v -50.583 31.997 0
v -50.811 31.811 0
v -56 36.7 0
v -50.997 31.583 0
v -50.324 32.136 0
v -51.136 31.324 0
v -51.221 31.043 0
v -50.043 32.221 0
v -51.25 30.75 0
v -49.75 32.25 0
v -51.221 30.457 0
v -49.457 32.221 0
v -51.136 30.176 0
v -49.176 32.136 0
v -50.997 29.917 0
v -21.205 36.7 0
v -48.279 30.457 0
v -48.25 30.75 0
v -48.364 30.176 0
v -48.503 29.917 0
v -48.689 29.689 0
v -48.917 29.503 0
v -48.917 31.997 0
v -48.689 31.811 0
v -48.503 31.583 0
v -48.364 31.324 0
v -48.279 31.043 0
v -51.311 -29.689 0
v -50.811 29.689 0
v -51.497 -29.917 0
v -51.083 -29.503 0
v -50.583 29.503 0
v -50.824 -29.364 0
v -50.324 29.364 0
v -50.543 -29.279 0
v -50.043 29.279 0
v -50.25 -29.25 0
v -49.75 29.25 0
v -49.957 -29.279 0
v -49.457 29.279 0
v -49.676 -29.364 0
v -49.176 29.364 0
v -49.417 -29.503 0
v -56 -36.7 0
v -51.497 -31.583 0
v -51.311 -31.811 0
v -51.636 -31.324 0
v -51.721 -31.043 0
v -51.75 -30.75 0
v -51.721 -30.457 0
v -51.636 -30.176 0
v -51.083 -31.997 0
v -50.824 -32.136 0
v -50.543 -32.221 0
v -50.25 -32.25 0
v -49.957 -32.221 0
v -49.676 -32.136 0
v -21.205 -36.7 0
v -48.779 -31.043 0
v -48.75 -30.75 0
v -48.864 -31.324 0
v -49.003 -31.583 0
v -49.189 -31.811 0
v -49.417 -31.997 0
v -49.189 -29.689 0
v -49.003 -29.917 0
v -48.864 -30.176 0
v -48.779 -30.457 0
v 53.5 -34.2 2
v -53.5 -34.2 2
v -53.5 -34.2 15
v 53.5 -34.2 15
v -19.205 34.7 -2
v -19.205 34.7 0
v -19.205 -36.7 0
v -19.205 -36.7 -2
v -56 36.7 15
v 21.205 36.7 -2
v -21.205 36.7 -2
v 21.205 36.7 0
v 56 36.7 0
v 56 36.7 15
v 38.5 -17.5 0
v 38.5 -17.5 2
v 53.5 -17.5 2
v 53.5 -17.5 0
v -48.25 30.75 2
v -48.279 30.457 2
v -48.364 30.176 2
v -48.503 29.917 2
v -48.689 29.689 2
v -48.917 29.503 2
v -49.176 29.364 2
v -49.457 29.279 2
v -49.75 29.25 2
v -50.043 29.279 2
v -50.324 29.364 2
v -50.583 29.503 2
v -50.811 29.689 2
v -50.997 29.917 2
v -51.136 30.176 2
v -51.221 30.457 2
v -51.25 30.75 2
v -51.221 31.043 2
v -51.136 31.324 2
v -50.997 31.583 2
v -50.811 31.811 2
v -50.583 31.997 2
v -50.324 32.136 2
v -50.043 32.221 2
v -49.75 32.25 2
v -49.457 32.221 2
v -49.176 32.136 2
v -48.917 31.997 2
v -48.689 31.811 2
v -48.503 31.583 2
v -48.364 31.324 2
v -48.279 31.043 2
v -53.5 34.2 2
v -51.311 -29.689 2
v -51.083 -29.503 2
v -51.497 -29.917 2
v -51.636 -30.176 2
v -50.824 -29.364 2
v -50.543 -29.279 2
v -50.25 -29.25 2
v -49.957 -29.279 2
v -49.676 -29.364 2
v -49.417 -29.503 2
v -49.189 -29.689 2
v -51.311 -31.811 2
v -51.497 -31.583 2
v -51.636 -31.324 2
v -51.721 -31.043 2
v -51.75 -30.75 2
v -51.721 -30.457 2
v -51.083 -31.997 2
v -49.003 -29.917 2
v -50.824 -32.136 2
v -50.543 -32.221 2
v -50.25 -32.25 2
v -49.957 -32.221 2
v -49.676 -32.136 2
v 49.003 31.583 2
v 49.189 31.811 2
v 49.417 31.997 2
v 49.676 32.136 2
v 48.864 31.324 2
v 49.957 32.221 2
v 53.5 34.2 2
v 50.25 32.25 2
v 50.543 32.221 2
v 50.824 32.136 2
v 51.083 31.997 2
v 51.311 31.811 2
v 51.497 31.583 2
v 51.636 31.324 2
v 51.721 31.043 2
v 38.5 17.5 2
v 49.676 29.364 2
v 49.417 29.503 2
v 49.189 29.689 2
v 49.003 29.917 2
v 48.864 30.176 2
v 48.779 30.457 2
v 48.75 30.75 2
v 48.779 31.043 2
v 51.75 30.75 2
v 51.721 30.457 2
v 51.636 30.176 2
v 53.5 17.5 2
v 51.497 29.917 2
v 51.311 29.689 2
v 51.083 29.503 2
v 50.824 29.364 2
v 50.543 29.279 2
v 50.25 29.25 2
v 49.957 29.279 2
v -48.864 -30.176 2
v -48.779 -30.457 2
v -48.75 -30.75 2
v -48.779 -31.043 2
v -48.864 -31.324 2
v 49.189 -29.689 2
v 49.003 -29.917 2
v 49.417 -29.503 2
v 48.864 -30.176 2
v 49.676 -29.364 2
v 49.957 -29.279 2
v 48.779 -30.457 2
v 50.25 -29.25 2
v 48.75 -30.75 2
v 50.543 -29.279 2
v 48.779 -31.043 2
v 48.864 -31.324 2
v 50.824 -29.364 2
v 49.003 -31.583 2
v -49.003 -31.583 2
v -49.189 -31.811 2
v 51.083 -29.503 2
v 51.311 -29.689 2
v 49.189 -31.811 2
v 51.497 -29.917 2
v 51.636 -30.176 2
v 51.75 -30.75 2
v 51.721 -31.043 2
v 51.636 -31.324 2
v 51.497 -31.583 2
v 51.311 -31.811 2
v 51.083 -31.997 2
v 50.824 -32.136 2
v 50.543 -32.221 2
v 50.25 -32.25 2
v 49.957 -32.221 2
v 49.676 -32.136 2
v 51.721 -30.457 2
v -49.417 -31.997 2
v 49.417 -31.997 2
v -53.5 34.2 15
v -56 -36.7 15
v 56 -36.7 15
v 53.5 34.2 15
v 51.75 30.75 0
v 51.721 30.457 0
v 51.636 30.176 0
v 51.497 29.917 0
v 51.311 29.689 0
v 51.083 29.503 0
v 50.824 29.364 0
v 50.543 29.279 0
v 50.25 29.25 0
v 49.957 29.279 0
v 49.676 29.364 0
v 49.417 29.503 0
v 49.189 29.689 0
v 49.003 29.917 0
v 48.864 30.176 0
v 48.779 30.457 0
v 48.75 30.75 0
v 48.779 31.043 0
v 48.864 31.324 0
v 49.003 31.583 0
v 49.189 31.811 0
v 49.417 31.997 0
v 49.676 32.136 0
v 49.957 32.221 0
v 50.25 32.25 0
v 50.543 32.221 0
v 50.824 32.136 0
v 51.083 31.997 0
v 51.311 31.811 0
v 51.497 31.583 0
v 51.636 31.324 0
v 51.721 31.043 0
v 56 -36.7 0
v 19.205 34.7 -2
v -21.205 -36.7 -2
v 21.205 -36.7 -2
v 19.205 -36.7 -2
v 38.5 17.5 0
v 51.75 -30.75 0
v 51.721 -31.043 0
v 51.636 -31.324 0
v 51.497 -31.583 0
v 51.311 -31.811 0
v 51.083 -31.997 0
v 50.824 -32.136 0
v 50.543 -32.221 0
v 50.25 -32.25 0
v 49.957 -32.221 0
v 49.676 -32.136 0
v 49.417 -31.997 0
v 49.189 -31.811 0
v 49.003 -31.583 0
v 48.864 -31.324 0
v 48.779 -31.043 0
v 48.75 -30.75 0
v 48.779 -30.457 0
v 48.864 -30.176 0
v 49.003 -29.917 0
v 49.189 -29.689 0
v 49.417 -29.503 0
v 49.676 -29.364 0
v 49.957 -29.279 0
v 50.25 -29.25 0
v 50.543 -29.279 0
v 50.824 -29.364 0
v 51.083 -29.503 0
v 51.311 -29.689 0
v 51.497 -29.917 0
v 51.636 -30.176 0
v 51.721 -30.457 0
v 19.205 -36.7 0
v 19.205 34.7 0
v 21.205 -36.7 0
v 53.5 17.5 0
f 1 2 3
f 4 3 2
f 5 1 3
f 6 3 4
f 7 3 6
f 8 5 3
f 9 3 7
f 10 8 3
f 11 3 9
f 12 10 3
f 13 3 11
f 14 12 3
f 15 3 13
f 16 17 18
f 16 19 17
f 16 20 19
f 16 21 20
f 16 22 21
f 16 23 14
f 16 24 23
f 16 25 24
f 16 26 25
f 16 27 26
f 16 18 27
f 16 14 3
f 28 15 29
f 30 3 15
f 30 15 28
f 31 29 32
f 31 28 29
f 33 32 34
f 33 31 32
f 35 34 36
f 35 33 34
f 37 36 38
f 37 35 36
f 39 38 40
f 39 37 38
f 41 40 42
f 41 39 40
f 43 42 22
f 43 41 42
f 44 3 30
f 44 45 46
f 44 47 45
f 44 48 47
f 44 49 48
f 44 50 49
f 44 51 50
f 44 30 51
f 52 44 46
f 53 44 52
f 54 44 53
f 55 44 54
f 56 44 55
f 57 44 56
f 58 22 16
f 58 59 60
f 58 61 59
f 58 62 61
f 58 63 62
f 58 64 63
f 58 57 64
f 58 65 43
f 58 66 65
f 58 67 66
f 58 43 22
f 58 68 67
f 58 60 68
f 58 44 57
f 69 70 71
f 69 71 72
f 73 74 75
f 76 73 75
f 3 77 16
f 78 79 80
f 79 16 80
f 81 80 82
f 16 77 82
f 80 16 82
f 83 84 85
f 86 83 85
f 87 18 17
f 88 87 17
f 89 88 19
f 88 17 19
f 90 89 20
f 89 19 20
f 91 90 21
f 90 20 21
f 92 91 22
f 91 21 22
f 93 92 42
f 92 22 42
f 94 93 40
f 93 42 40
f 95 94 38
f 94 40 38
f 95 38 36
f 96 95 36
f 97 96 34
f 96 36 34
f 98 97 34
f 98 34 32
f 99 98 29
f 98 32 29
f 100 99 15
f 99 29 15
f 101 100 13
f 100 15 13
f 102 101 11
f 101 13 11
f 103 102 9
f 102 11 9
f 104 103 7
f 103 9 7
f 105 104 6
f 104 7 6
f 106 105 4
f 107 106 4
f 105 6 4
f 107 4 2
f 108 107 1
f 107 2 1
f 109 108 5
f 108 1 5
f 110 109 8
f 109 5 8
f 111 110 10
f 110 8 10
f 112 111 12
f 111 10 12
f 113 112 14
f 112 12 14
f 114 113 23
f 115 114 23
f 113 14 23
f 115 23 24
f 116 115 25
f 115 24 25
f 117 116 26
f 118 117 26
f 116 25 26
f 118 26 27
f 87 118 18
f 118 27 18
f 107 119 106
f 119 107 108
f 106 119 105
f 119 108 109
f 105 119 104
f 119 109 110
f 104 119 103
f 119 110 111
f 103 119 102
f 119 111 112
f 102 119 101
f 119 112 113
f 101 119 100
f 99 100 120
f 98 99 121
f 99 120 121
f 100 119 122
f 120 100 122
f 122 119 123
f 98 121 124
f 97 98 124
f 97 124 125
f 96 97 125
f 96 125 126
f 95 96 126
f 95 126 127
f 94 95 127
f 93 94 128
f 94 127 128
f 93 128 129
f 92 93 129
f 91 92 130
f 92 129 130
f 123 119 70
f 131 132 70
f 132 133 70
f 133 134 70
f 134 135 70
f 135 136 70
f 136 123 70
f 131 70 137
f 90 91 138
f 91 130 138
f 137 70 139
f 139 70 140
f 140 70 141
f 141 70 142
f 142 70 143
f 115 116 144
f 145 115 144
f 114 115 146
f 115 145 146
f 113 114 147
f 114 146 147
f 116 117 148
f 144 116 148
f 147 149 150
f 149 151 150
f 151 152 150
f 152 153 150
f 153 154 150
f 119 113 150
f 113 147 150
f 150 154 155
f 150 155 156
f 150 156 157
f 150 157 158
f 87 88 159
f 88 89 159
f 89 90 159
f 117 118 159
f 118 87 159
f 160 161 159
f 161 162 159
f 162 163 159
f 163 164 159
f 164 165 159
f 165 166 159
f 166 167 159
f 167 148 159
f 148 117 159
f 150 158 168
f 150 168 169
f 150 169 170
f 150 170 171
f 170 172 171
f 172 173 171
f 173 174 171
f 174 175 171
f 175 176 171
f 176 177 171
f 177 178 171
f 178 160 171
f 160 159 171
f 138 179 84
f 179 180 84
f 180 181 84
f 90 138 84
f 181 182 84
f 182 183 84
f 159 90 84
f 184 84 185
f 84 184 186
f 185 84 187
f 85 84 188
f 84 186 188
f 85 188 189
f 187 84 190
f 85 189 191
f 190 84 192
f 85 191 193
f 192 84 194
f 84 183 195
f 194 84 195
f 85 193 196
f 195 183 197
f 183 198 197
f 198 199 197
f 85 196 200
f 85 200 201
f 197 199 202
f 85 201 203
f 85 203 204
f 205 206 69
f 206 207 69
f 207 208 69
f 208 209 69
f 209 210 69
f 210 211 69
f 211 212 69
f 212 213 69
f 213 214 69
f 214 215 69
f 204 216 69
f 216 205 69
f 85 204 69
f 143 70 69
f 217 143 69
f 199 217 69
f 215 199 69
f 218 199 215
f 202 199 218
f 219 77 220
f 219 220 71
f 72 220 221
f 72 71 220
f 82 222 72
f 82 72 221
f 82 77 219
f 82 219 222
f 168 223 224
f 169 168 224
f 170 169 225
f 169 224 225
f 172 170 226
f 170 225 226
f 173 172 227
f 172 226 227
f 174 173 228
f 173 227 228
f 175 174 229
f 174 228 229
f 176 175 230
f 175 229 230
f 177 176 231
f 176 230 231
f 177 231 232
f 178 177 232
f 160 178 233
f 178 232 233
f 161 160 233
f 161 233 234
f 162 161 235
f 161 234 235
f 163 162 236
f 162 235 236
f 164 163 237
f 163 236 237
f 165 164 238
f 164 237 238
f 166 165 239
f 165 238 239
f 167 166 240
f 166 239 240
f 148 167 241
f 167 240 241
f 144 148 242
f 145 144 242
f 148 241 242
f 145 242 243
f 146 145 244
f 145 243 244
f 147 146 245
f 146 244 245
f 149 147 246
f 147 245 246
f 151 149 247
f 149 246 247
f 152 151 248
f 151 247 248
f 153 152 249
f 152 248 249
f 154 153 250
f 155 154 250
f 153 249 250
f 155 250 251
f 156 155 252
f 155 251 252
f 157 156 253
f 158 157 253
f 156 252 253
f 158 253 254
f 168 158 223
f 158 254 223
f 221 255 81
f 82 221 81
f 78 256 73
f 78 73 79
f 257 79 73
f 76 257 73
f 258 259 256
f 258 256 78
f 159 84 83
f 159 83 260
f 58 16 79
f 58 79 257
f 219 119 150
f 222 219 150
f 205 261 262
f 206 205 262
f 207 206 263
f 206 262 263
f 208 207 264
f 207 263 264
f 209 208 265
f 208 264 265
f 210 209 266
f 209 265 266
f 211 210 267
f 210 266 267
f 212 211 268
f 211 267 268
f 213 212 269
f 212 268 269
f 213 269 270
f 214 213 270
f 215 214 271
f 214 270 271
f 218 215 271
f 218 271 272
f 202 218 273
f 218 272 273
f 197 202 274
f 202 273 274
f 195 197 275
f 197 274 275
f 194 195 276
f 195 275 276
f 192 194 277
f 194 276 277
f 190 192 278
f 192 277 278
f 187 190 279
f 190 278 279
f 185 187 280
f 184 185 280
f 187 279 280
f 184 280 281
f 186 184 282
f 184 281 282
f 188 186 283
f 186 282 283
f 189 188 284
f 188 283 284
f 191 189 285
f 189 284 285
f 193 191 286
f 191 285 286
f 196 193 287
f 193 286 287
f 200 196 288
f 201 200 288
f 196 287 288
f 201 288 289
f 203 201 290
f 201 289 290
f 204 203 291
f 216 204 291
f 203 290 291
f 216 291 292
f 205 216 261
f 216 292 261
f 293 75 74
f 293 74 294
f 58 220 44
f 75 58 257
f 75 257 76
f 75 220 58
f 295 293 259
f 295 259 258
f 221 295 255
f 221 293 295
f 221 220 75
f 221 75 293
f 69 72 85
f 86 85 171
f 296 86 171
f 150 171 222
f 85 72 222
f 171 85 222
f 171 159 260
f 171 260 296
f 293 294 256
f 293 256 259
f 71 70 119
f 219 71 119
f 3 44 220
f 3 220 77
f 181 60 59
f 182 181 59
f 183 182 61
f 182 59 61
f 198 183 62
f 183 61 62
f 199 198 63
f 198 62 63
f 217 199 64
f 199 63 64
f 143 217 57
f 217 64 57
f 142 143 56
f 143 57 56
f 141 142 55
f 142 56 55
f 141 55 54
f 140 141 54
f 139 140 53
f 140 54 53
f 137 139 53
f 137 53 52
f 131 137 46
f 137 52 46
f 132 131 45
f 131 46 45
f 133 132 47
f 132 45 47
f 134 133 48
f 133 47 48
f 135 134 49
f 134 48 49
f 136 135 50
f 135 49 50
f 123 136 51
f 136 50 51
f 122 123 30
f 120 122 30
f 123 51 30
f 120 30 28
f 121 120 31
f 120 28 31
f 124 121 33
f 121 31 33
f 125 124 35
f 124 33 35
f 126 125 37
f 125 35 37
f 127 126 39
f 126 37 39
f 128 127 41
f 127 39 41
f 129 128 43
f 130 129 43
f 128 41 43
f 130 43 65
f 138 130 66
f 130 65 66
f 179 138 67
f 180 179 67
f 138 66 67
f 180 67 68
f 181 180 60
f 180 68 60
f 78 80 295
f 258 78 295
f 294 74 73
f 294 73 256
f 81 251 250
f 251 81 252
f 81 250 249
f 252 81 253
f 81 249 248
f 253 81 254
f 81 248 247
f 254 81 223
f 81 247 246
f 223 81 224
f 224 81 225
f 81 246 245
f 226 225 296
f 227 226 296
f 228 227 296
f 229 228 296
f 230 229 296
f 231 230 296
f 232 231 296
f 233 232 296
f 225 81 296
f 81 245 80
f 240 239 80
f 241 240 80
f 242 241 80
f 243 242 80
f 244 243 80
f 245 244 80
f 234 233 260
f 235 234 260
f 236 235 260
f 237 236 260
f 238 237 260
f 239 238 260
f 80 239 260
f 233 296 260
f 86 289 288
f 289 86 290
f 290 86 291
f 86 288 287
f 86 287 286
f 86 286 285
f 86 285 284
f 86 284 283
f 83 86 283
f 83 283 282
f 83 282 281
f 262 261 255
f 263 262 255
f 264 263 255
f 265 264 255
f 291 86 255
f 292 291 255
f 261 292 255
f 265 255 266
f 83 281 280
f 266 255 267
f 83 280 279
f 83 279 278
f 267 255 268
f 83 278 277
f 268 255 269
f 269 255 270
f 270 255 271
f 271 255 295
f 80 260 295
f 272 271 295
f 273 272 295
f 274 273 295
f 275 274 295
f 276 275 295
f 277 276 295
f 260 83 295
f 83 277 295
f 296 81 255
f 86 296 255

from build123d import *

# Parameters (mm, degrees)
SKETCH_W        = 112
SKETCH_H        = 73.4
SKETCH_W_2      = 107
SKETCH_H_2      = 68.4
PAD_DEPTH       = 15
SKETCH001_W     = 6.5
SKETCH001_H     = 6.5
SKETCH001_W_2   = 7.5
PAD001_DEPTH    = 2
SKETCH002_R     = 1.5
POCKET_DEPTH    = 2
SKETCH003_W     = 2
SKETCH003_H     = 73.4
PAD002_DEPTH    = 2
PAD003_DEPTH    = 2
SKETCH005_W     = 15
SKETCH005_H     = 35
POCKET001_DEPTH = 5
SKETCH006_W     = 38.41
SKETCH006_H     = 2
PAD004_DEPTH    = 2


with BuildPart() as part:
    # Sketch → Pad (new body)
    with BuildSketch(Plane.XY):
        Rectangle(SKETCH_W, SKETCH_H)
        Rectangle(SKETCH_W_2, SKETCH_H_2, mode=Mode.SUBTRACT)
    extrude(amount=PAD_DEPTH)

    # Sketch001 (on Face9 of Pad) → Pad001 (join)
    with BuildSketch(Plane(origin=(0, 0, 0), x_dir=(1, 0, 0), z_dir=(0, 0, -1))):
        with Locations((-50.25, 30.95)):
            Rectangle(SKETCH001_W, SKETCH001_H)
        with Locations((-49.75, -30.95)):
            Rectangle(SKETCH001_W_2, SKETCH001_H)
        with Locations((50.25, 30.95)):
            Rectangle(SKETCH001_W, SKETCH001_H)
        with Locations((50.25, -30.95)):
            Rectangle(SKETCH001_W, SKETCH001_H)
    extrude(amount=-PAD001_DEPTH)

    # Sketch002 (on Face22 of Pad001) → Pocket (cut)
    with BuildSketch(Plane(origin=(0, 0, 0), x_dir=(1, 0, 0), z_dir=(0, 0, -1))):
        with Locations((-50.25, 30.75)):
            Circle(SKETCH002_R)
        with Locations((50.25, -30.75)):
            Circle(SKETCH002_R)
        with Locations((-49.75, -30.75)):
            Circle(SKETCH002_R)
        with Locations((50.25, 30.75)):
            Circle(SKETCH002_R)
    extrude(amount=-POCKET_DEPTH, mode=Mode.SUBTRACT)

    # Sketch003 (on Face9 of Pad) → Pad002 (join)
    with BuildSketch(Plane(origin=(0, 0, 0), x_dir=(1, 0, 0), z_dir=(0, 0, -1))):
        with Locations((-20.205, 0)):
            Rectangle(SKETCH003_W, SKETCH003_H)
        with Locations((20.205, 0)):
            Rectangle(SKETCH003_W, SKETCH003_H)
    extrude(amount=PAD002_DEPTH)

    # Sketch004 (on Face4 of Pocket) → Pad003 (join)
    with BuildSketch(Plane(origin=(0, 0, 0), x_dir=(1, 0, 0), z_dir=(0, 0, -1))):
        Polygon((47, -34.2), (-46, -34.2), (-46, -27.7), (-53.5, -27.7), (-53.5, 27.7), (-47, 27.7), (-47, 34.2), (47, 34.2), (47, 27.7), (53.5, 27.7), (53.5, -27.7), (47, -27.7), align=None)
    extrude(amount=-PAD003_DEPTH)

    # Sketch005 (on Face23 of Pad003) → Pocket001 (cut)
    with BuildSketch(Plane.XY.offset(2)):
        with Locations((46, 0)):
            Rectangle(SKETCH005_W, SKETCH005_H)
    extrude(amount=-POCKET001_DEPTH, mode=Mode.SUBTRACT)

    # Sketch006 (on Face11 of Pocket001) → Pad004 (join)
    with BuildSketch(Plane(origin=(0, 0, 0), x_dir=(1, 0, 0), z_dir=(0, 0, -1))):
        with Locations((0, -35.7)):
            Rectangle(SKETCH006_W, SKETCH006_H)
    extrude(amount=PAD004_DEPTH)


solid = part.part
